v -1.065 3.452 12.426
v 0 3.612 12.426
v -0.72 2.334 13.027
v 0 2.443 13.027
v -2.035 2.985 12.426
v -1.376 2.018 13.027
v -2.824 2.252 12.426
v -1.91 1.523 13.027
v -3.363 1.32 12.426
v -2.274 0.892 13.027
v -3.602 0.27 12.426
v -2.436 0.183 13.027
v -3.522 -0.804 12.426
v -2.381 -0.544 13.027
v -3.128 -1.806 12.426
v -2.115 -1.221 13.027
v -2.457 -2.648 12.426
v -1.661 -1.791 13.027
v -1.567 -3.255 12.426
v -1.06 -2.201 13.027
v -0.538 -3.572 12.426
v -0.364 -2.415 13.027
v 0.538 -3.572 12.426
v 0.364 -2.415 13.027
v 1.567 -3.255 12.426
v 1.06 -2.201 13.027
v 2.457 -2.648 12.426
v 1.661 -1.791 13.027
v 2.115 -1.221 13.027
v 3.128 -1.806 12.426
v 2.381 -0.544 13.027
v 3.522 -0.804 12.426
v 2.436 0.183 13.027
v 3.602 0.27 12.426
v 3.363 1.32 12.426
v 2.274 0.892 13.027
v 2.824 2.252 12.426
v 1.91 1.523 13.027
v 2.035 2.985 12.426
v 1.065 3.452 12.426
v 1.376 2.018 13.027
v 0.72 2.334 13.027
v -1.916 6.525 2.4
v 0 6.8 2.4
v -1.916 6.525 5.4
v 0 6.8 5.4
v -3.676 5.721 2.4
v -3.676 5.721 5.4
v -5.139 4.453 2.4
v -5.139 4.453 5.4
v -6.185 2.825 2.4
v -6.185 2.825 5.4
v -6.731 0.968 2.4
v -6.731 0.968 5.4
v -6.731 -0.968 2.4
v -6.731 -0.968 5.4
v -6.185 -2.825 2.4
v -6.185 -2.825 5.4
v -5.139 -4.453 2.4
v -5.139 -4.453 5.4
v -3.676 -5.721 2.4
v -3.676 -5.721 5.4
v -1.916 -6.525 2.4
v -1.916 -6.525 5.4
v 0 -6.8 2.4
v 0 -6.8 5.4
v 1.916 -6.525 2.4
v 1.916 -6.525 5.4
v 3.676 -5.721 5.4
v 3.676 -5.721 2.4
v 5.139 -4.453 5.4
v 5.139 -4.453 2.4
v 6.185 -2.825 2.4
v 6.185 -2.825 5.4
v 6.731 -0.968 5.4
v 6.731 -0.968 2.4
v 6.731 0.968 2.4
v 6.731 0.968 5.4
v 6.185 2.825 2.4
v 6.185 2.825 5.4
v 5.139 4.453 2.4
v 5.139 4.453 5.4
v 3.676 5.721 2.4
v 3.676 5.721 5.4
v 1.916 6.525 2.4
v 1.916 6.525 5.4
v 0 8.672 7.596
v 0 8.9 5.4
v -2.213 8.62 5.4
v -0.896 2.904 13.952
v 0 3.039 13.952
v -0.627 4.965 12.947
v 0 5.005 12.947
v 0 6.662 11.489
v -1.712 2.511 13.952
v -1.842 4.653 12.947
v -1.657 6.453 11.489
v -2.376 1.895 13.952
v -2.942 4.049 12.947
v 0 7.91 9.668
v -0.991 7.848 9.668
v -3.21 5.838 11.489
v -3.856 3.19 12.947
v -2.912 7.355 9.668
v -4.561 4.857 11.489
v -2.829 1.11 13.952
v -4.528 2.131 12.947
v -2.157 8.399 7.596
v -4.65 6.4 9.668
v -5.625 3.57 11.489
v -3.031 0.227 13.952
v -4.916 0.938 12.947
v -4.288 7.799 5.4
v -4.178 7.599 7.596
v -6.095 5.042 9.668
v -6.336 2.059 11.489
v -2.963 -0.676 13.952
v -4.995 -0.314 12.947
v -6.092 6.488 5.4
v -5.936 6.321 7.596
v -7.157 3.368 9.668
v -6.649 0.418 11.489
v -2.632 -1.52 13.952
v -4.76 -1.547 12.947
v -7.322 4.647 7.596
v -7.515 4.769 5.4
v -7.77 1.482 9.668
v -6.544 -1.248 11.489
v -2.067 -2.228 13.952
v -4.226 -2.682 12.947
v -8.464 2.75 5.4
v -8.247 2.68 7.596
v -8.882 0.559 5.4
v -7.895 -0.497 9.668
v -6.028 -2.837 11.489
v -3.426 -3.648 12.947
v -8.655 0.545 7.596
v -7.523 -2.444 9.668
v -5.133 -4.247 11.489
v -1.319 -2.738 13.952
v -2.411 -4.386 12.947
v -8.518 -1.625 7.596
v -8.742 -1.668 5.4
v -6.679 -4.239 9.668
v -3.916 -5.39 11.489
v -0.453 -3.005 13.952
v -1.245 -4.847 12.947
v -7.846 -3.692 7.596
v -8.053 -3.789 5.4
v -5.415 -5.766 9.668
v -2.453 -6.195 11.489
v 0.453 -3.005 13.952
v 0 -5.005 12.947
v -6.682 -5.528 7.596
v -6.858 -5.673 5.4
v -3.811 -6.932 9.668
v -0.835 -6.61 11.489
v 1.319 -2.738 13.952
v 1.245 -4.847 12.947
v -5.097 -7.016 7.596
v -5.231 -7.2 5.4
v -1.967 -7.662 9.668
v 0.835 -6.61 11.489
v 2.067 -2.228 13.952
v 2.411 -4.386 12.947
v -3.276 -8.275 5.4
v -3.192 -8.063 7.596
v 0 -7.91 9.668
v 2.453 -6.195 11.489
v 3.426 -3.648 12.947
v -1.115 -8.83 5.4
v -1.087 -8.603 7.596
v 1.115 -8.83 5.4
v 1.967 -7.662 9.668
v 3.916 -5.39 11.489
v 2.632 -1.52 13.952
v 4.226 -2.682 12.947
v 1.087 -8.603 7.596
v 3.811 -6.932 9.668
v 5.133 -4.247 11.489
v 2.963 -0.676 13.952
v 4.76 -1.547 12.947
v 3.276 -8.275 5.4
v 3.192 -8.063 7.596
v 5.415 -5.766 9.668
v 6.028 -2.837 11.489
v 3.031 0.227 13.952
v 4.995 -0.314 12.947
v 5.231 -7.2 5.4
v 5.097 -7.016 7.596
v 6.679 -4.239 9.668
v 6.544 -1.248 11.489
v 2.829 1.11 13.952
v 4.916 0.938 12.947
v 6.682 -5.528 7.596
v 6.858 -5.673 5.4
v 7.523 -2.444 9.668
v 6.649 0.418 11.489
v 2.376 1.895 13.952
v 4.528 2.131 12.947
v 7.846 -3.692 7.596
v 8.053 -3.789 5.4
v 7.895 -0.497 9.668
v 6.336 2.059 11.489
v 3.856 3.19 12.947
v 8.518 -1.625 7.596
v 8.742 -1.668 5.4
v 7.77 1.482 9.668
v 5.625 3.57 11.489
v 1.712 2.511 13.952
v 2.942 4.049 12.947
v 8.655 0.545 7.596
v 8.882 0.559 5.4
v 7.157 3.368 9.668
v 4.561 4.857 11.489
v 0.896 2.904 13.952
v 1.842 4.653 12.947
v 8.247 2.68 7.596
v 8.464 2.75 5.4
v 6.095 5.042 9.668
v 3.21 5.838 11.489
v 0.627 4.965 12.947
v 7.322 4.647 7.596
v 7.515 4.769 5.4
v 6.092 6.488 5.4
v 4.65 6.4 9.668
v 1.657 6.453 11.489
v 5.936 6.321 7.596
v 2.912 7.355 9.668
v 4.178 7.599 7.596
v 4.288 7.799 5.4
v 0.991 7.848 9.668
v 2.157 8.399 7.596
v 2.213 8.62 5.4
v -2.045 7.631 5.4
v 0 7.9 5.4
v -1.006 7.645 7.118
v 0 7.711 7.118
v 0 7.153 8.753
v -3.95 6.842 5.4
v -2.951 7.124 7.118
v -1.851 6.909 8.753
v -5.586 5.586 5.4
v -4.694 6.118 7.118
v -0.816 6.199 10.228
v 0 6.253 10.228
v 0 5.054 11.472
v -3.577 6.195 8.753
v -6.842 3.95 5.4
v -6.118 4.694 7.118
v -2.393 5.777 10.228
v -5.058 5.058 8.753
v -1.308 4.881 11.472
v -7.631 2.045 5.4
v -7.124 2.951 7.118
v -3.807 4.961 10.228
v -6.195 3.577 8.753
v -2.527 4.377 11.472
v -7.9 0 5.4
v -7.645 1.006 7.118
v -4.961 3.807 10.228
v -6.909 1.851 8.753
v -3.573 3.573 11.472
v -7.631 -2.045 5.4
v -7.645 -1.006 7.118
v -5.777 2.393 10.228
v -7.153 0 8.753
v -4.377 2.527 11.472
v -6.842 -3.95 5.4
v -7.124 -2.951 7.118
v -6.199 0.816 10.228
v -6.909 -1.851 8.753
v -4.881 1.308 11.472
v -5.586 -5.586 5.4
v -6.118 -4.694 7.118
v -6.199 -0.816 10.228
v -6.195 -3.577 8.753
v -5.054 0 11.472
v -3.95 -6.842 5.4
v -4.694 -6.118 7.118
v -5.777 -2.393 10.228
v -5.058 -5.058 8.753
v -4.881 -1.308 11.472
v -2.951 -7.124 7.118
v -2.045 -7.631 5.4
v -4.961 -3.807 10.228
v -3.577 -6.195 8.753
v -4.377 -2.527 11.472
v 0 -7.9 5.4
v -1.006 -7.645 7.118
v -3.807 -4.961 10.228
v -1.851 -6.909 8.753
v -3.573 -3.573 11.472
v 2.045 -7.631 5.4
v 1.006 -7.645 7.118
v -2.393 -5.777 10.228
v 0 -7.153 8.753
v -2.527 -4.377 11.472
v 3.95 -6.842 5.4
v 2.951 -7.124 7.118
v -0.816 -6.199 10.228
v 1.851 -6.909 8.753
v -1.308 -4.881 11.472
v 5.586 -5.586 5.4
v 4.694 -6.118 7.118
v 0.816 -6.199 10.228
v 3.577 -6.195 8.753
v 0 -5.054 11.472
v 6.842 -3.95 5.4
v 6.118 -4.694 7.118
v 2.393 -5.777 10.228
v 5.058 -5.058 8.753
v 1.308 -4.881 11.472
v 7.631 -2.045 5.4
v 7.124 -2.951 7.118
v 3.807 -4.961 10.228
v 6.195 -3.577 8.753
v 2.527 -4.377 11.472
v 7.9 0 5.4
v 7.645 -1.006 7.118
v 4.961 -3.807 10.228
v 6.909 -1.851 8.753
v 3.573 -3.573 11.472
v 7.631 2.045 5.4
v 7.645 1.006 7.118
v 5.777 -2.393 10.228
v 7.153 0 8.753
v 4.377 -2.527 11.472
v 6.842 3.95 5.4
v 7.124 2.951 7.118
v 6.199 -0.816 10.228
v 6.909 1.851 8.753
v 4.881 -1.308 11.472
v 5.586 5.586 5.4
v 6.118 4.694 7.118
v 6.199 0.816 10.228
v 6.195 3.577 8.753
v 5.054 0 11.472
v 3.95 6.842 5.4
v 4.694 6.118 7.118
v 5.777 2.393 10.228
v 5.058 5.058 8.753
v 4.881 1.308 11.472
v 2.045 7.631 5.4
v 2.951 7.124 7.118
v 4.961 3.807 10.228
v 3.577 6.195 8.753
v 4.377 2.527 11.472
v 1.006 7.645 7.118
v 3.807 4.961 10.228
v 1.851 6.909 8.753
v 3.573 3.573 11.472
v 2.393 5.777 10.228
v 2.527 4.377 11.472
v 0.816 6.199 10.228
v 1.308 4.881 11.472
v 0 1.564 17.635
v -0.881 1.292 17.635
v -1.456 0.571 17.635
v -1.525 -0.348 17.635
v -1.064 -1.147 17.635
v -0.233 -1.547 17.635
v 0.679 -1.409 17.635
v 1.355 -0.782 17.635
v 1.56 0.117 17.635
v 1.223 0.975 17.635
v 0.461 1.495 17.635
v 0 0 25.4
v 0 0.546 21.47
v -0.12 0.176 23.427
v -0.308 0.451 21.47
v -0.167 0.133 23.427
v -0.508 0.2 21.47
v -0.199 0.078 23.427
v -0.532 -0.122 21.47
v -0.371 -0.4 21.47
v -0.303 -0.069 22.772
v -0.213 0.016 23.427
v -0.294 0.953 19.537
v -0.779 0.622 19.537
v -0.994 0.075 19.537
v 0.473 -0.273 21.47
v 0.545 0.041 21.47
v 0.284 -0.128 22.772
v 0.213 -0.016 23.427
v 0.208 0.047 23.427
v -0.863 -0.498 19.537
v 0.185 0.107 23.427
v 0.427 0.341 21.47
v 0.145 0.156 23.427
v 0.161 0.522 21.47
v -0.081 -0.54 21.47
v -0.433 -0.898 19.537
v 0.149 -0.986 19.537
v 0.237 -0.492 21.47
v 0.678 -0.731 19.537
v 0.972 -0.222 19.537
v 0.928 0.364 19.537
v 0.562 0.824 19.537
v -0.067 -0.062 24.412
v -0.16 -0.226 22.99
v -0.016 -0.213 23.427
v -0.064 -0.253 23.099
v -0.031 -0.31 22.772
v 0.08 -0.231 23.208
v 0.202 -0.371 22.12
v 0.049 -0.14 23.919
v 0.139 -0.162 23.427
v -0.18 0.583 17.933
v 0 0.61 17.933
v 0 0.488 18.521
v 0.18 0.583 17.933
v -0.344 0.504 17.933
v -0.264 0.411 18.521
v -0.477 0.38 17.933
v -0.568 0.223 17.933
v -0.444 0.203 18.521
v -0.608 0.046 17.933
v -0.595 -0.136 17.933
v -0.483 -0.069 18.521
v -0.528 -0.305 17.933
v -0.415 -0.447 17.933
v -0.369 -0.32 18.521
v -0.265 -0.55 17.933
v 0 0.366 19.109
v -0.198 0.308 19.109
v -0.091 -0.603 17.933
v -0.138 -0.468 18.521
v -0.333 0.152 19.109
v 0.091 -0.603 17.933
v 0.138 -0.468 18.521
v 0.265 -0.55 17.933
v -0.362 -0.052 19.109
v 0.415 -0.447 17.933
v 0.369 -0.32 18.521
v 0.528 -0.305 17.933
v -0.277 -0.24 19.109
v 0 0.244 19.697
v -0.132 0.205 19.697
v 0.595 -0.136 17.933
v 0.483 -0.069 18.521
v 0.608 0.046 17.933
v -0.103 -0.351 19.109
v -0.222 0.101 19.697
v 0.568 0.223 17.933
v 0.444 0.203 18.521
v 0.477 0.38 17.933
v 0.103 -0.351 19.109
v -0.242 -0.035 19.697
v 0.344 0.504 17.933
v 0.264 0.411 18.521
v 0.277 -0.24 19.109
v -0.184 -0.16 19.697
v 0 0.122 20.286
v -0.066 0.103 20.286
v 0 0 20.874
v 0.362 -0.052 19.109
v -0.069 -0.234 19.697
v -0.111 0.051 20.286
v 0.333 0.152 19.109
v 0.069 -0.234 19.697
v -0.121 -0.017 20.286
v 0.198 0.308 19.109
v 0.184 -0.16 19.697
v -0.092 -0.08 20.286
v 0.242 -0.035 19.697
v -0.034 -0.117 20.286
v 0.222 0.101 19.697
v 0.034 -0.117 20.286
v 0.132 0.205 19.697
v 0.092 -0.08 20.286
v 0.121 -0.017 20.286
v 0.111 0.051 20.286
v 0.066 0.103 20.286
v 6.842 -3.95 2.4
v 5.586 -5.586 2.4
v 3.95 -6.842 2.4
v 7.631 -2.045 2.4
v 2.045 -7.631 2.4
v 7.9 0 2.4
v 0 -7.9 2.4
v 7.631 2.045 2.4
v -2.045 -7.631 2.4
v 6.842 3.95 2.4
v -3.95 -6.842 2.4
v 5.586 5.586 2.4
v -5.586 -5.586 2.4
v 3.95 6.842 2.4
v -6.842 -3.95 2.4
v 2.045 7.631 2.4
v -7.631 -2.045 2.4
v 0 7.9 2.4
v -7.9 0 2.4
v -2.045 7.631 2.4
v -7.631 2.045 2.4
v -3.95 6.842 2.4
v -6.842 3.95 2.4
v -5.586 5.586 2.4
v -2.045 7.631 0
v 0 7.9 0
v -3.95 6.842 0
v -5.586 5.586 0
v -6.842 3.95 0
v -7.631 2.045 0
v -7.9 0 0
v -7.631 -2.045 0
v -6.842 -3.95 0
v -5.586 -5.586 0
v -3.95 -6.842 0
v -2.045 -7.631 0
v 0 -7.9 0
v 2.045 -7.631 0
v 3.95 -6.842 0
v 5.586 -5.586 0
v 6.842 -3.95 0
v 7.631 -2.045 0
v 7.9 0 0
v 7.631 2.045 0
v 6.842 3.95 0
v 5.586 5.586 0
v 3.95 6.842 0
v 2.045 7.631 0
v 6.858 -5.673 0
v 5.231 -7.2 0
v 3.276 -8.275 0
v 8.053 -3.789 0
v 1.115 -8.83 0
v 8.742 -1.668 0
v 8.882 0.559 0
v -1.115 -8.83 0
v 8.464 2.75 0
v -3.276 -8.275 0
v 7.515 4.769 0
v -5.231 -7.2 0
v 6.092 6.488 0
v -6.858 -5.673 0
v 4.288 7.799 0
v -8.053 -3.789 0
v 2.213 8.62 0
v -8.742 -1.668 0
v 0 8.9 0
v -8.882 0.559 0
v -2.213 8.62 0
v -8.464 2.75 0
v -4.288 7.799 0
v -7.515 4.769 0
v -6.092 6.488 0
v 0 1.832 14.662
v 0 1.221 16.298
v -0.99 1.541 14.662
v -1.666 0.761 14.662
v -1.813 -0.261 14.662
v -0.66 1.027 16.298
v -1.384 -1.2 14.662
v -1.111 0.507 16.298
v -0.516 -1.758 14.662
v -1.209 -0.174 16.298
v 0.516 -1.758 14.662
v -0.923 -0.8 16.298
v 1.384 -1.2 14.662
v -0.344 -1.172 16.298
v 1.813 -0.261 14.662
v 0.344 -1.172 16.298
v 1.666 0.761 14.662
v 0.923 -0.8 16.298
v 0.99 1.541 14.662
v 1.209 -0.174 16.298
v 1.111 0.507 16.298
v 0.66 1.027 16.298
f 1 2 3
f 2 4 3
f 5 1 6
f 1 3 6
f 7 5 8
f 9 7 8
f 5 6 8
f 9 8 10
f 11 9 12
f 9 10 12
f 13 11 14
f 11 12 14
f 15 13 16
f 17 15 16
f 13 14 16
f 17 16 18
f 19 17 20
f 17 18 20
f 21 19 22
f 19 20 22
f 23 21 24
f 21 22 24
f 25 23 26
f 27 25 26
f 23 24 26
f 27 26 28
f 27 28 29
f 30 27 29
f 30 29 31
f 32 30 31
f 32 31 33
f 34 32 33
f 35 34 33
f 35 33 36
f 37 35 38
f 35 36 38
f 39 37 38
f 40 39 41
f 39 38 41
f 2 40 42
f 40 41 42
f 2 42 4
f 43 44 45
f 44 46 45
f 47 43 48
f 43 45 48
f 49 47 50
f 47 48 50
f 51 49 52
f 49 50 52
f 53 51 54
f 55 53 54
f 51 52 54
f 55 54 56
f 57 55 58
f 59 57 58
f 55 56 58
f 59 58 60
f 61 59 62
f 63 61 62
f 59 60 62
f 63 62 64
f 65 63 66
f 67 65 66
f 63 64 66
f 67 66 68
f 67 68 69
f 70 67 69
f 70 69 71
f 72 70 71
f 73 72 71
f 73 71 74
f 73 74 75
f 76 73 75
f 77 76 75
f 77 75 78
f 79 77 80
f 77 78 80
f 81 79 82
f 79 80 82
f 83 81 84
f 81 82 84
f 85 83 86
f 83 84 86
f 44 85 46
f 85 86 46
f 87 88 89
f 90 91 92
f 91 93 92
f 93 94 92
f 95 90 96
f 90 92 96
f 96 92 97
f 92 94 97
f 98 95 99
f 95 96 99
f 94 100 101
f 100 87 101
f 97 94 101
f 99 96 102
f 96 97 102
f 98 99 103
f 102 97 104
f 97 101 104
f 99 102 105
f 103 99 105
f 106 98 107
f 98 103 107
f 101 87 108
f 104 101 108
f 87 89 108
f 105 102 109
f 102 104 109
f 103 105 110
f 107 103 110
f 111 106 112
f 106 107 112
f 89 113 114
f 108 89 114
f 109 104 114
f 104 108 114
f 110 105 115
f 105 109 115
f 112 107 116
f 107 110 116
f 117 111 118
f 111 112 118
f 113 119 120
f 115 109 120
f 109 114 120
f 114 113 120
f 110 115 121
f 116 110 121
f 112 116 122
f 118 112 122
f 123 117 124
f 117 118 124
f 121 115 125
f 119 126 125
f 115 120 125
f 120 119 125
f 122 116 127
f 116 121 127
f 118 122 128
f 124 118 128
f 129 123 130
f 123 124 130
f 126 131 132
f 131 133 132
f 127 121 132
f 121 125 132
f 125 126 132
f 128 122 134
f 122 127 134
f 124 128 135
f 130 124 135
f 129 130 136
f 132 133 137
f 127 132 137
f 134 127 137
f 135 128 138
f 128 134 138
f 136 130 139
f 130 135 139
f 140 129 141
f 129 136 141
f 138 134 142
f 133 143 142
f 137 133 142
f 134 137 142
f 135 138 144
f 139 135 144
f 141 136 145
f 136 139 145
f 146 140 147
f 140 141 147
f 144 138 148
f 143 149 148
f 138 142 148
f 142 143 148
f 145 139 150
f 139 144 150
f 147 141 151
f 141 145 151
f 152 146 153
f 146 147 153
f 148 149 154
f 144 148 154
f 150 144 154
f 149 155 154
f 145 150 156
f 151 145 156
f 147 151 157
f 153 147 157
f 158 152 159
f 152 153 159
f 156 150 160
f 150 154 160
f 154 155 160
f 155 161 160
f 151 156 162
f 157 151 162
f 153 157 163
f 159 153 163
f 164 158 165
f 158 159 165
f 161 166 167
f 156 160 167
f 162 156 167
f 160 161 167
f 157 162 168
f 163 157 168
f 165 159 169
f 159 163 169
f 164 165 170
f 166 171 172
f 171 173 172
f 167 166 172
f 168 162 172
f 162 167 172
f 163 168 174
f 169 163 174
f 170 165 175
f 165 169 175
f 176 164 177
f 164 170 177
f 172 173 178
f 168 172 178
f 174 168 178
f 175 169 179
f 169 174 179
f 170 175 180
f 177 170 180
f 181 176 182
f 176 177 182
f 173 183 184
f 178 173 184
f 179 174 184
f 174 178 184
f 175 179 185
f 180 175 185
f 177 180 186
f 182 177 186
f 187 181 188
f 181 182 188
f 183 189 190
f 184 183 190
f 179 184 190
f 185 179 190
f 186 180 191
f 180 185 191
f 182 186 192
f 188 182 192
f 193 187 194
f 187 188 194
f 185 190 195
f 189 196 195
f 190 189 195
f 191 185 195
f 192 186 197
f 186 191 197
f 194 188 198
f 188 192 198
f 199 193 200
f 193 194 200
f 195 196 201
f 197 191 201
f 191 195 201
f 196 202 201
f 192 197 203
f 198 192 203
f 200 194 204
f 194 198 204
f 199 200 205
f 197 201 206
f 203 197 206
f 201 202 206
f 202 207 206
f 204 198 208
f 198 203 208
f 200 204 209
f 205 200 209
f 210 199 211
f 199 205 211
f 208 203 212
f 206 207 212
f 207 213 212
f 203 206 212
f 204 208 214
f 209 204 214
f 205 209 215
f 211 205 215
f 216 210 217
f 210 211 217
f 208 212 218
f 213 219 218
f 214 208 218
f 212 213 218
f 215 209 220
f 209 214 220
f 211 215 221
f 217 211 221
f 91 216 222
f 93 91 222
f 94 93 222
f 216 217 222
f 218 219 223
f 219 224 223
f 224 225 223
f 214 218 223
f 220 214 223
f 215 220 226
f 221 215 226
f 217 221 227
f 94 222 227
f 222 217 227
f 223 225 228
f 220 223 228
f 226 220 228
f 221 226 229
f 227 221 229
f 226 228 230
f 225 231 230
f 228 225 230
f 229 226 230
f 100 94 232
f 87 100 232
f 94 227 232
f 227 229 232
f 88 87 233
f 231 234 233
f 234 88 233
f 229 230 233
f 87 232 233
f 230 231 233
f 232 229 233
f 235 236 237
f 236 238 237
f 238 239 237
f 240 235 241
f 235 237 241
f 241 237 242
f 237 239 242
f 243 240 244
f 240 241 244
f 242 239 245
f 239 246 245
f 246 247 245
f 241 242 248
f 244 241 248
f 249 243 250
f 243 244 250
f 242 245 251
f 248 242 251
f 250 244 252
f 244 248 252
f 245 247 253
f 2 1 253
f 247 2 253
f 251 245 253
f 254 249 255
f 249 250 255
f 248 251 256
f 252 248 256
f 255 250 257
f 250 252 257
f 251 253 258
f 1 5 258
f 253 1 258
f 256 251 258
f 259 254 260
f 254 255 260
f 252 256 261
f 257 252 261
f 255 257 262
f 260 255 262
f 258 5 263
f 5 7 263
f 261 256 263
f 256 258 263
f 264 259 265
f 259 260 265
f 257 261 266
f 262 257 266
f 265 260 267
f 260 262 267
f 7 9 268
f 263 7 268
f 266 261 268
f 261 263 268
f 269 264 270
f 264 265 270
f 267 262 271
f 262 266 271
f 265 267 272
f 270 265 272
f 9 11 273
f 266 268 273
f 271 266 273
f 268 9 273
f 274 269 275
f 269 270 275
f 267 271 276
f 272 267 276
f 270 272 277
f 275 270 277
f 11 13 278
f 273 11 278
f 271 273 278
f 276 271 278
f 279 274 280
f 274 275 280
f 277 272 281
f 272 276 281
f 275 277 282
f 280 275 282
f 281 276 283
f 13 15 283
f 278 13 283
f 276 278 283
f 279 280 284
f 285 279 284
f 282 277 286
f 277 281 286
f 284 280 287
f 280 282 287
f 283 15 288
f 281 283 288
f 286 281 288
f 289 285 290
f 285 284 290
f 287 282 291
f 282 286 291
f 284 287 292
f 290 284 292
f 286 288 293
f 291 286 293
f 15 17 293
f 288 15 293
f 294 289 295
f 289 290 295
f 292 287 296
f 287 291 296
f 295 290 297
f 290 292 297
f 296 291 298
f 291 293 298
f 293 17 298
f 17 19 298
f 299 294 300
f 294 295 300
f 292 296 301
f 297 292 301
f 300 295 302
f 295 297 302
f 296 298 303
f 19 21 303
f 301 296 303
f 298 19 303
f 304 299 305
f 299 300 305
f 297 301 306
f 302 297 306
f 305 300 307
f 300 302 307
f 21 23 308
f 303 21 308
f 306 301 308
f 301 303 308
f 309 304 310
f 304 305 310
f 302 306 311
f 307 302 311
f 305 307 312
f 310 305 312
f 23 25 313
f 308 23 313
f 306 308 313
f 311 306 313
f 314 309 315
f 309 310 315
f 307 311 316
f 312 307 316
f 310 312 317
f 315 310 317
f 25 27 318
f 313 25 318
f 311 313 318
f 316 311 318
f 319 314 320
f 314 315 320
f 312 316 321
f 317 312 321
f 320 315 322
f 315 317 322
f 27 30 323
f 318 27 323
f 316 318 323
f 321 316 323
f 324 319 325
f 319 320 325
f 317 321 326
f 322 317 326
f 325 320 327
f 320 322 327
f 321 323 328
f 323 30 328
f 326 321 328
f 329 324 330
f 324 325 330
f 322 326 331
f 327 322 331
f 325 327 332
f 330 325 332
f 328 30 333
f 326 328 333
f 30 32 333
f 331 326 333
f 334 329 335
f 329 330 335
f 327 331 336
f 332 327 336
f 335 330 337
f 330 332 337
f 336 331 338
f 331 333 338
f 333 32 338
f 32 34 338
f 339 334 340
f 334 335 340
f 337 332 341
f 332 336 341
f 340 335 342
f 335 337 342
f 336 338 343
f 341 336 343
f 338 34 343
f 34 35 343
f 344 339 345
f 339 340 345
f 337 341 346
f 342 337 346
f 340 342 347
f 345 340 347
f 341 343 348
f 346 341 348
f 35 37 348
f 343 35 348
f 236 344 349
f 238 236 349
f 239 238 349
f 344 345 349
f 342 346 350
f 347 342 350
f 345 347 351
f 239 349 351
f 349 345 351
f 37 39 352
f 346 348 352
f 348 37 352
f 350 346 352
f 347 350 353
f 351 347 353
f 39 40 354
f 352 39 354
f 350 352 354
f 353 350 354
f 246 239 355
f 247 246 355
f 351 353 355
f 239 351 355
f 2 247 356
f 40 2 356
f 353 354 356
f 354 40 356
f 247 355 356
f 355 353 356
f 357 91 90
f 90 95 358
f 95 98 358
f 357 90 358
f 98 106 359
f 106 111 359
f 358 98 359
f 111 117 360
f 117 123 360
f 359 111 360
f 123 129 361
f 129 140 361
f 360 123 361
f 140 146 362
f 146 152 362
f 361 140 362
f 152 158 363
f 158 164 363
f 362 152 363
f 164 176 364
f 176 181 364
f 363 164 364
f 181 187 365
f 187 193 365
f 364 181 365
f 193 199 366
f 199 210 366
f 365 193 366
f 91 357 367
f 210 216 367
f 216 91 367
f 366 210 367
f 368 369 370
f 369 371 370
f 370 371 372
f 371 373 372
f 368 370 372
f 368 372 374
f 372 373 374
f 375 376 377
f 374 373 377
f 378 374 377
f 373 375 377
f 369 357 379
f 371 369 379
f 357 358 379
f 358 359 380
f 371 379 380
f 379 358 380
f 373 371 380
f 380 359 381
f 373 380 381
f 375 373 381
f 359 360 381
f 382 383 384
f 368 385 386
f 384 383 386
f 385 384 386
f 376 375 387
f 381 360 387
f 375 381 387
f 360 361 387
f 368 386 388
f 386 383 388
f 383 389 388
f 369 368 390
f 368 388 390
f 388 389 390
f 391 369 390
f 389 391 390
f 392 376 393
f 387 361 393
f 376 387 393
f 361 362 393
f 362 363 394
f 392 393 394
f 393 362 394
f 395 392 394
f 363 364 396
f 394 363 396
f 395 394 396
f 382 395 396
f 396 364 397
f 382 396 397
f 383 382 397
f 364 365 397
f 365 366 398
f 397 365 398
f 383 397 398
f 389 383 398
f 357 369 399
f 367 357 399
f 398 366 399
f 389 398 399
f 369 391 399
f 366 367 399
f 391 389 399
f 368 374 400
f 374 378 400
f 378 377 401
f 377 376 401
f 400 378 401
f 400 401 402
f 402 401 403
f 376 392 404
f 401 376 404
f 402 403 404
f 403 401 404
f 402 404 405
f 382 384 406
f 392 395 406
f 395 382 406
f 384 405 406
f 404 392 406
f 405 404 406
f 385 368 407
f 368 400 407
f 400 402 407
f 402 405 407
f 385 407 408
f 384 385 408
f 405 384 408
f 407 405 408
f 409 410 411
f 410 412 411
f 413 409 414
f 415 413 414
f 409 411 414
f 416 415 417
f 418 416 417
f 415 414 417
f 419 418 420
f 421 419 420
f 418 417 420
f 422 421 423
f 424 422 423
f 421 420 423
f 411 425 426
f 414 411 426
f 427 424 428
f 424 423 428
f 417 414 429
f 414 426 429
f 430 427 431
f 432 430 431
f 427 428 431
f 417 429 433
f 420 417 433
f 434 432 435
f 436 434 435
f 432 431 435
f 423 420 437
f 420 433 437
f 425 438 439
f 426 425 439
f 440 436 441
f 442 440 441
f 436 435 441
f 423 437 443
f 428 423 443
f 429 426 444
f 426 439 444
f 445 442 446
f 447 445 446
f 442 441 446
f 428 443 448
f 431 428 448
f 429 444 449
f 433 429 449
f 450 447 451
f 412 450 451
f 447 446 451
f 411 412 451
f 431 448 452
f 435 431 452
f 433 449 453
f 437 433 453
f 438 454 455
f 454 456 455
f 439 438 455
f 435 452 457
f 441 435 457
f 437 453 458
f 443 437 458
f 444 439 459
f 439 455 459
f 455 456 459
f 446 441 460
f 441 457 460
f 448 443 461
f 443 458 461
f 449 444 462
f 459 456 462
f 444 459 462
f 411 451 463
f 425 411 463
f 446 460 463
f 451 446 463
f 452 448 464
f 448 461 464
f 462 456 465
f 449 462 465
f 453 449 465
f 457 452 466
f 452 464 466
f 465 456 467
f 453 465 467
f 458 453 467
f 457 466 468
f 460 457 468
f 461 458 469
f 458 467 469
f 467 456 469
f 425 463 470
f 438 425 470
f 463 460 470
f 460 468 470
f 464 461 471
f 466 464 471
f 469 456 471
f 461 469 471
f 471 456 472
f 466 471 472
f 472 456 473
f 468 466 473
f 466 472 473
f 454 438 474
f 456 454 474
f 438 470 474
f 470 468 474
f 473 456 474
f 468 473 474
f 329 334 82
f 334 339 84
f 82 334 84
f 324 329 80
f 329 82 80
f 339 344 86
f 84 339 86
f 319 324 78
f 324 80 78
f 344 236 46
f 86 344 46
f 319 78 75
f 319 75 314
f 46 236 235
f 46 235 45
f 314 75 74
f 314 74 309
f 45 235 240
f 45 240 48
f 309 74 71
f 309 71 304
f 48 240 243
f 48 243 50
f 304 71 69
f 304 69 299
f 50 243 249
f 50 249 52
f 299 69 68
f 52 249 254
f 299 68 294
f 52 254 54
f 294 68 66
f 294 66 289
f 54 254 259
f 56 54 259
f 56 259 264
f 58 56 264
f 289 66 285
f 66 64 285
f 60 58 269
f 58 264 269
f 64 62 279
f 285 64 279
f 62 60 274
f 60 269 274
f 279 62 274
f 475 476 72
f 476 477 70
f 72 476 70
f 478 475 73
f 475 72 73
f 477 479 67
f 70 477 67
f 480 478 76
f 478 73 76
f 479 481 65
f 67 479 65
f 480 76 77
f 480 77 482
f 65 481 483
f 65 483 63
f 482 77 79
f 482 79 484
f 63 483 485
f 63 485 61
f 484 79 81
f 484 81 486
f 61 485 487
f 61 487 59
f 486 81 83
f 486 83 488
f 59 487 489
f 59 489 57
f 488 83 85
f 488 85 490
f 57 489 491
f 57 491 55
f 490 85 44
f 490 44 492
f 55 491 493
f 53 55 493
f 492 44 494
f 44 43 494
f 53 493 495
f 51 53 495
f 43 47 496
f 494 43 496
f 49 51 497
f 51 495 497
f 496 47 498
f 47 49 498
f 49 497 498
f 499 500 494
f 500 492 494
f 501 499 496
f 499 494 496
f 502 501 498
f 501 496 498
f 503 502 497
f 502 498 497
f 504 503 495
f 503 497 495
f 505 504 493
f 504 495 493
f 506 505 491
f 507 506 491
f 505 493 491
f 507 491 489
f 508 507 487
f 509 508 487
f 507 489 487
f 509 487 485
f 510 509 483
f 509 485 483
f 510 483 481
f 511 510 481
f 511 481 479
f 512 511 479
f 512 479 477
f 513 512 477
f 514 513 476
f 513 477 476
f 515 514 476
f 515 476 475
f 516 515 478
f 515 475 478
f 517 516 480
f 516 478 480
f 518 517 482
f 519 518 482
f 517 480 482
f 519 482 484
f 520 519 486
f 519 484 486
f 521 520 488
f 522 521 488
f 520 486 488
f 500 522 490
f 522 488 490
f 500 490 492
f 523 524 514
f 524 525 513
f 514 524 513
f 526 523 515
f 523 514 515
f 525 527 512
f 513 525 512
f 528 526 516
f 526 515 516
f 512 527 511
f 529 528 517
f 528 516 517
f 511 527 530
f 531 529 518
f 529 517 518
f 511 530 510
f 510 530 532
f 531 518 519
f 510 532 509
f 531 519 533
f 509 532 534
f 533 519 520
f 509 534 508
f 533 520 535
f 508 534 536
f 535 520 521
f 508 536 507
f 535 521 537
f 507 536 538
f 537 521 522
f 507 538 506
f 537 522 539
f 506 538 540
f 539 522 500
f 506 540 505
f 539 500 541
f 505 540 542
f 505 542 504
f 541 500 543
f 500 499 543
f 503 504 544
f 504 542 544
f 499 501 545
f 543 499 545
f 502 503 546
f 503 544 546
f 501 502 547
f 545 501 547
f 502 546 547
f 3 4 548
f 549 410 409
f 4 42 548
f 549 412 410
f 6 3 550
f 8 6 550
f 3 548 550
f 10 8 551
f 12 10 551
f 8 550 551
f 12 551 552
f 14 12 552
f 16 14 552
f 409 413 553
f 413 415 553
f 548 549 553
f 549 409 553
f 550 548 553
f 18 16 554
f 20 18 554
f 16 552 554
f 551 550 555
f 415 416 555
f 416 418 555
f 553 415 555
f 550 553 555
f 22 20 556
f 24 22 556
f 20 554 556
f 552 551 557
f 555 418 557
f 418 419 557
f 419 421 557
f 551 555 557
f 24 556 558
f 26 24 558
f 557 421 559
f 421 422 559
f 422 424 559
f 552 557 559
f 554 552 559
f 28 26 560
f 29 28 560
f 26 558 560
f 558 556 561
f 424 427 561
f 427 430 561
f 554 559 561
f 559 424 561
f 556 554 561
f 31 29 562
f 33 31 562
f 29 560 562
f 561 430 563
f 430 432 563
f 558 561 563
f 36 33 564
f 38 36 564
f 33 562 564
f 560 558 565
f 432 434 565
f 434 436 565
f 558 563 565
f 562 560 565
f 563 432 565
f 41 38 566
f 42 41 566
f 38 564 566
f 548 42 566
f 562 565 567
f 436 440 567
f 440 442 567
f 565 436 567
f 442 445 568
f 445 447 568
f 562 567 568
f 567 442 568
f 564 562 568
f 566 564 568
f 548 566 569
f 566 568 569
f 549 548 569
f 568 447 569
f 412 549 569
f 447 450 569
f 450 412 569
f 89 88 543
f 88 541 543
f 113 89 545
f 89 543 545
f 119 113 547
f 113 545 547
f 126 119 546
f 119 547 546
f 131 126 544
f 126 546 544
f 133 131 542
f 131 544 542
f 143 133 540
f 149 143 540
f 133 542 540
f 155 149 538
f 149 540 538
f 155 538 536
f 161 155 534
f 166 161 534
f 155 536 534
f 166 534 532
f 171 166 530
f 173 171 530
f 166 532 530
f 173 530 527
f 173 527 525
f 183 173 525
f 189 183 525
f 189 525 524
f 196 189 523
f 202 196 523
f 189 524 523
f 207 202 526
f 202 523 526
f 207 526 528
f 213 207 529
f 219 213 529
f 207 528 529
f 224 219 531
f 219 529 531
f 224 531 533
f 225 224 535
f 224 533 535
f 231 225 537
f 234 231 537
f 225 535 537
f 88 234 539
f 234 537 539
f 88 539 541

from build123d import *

# Parameters (mm, degrees)
F3_ANGLE = 90


with BuildPart() as f1:
    # F0 (on Top) → F1 (revolve)
    with BuildSketch(Plane.XY):
        with BuildLine():
            Line((0, 8.9), (0, 7.9))
            Line((0, 7.9), (2.4, 7.9))
            Line((2.4, 7.9), (2.4, 6.8))
            Line((2.4, 6.8), (5.4, 6.8))
            Line((5.4, 6.8), (5.4, 7.9))
            ThreePointArc((5.4, 7.9), (9.5153331571, 6.7434437053), (12.4257006262, 3.6124134192))
            Line((12.4257006262, 3.6124134192), (13.0271804842, 2.4426089354))
            Line((13.0271804842, 2.4426089354), (17.9327297956, 0.6101466133))
            Line((17.9327297956, 0.6101466133), (20.8739452064, 0))
            Line((20.8739452064, 0), (25.4, 0))
            ThreePointArc((25.4, 0), (19.537082279, 0.996970145), (13.951692761, 3.0393162482))
            ThreePointArc((13.951692761, 3.0393162482), (10.617032549, 7.3430021373), (5.4, 8.9))
            Line((5.4, 8.9), (0, 8.9))
        make_face()
    revolve(axis=Axis((12.5827532146, 0, 0), (1, 0, 0)))


with BuildPart() as f1_1:
    # F3: moved
    add(f1.part.rotate(Axis((0, 0, 0), (0, -1, 0)), F3_ANGLE))


solid = f1_1.part
